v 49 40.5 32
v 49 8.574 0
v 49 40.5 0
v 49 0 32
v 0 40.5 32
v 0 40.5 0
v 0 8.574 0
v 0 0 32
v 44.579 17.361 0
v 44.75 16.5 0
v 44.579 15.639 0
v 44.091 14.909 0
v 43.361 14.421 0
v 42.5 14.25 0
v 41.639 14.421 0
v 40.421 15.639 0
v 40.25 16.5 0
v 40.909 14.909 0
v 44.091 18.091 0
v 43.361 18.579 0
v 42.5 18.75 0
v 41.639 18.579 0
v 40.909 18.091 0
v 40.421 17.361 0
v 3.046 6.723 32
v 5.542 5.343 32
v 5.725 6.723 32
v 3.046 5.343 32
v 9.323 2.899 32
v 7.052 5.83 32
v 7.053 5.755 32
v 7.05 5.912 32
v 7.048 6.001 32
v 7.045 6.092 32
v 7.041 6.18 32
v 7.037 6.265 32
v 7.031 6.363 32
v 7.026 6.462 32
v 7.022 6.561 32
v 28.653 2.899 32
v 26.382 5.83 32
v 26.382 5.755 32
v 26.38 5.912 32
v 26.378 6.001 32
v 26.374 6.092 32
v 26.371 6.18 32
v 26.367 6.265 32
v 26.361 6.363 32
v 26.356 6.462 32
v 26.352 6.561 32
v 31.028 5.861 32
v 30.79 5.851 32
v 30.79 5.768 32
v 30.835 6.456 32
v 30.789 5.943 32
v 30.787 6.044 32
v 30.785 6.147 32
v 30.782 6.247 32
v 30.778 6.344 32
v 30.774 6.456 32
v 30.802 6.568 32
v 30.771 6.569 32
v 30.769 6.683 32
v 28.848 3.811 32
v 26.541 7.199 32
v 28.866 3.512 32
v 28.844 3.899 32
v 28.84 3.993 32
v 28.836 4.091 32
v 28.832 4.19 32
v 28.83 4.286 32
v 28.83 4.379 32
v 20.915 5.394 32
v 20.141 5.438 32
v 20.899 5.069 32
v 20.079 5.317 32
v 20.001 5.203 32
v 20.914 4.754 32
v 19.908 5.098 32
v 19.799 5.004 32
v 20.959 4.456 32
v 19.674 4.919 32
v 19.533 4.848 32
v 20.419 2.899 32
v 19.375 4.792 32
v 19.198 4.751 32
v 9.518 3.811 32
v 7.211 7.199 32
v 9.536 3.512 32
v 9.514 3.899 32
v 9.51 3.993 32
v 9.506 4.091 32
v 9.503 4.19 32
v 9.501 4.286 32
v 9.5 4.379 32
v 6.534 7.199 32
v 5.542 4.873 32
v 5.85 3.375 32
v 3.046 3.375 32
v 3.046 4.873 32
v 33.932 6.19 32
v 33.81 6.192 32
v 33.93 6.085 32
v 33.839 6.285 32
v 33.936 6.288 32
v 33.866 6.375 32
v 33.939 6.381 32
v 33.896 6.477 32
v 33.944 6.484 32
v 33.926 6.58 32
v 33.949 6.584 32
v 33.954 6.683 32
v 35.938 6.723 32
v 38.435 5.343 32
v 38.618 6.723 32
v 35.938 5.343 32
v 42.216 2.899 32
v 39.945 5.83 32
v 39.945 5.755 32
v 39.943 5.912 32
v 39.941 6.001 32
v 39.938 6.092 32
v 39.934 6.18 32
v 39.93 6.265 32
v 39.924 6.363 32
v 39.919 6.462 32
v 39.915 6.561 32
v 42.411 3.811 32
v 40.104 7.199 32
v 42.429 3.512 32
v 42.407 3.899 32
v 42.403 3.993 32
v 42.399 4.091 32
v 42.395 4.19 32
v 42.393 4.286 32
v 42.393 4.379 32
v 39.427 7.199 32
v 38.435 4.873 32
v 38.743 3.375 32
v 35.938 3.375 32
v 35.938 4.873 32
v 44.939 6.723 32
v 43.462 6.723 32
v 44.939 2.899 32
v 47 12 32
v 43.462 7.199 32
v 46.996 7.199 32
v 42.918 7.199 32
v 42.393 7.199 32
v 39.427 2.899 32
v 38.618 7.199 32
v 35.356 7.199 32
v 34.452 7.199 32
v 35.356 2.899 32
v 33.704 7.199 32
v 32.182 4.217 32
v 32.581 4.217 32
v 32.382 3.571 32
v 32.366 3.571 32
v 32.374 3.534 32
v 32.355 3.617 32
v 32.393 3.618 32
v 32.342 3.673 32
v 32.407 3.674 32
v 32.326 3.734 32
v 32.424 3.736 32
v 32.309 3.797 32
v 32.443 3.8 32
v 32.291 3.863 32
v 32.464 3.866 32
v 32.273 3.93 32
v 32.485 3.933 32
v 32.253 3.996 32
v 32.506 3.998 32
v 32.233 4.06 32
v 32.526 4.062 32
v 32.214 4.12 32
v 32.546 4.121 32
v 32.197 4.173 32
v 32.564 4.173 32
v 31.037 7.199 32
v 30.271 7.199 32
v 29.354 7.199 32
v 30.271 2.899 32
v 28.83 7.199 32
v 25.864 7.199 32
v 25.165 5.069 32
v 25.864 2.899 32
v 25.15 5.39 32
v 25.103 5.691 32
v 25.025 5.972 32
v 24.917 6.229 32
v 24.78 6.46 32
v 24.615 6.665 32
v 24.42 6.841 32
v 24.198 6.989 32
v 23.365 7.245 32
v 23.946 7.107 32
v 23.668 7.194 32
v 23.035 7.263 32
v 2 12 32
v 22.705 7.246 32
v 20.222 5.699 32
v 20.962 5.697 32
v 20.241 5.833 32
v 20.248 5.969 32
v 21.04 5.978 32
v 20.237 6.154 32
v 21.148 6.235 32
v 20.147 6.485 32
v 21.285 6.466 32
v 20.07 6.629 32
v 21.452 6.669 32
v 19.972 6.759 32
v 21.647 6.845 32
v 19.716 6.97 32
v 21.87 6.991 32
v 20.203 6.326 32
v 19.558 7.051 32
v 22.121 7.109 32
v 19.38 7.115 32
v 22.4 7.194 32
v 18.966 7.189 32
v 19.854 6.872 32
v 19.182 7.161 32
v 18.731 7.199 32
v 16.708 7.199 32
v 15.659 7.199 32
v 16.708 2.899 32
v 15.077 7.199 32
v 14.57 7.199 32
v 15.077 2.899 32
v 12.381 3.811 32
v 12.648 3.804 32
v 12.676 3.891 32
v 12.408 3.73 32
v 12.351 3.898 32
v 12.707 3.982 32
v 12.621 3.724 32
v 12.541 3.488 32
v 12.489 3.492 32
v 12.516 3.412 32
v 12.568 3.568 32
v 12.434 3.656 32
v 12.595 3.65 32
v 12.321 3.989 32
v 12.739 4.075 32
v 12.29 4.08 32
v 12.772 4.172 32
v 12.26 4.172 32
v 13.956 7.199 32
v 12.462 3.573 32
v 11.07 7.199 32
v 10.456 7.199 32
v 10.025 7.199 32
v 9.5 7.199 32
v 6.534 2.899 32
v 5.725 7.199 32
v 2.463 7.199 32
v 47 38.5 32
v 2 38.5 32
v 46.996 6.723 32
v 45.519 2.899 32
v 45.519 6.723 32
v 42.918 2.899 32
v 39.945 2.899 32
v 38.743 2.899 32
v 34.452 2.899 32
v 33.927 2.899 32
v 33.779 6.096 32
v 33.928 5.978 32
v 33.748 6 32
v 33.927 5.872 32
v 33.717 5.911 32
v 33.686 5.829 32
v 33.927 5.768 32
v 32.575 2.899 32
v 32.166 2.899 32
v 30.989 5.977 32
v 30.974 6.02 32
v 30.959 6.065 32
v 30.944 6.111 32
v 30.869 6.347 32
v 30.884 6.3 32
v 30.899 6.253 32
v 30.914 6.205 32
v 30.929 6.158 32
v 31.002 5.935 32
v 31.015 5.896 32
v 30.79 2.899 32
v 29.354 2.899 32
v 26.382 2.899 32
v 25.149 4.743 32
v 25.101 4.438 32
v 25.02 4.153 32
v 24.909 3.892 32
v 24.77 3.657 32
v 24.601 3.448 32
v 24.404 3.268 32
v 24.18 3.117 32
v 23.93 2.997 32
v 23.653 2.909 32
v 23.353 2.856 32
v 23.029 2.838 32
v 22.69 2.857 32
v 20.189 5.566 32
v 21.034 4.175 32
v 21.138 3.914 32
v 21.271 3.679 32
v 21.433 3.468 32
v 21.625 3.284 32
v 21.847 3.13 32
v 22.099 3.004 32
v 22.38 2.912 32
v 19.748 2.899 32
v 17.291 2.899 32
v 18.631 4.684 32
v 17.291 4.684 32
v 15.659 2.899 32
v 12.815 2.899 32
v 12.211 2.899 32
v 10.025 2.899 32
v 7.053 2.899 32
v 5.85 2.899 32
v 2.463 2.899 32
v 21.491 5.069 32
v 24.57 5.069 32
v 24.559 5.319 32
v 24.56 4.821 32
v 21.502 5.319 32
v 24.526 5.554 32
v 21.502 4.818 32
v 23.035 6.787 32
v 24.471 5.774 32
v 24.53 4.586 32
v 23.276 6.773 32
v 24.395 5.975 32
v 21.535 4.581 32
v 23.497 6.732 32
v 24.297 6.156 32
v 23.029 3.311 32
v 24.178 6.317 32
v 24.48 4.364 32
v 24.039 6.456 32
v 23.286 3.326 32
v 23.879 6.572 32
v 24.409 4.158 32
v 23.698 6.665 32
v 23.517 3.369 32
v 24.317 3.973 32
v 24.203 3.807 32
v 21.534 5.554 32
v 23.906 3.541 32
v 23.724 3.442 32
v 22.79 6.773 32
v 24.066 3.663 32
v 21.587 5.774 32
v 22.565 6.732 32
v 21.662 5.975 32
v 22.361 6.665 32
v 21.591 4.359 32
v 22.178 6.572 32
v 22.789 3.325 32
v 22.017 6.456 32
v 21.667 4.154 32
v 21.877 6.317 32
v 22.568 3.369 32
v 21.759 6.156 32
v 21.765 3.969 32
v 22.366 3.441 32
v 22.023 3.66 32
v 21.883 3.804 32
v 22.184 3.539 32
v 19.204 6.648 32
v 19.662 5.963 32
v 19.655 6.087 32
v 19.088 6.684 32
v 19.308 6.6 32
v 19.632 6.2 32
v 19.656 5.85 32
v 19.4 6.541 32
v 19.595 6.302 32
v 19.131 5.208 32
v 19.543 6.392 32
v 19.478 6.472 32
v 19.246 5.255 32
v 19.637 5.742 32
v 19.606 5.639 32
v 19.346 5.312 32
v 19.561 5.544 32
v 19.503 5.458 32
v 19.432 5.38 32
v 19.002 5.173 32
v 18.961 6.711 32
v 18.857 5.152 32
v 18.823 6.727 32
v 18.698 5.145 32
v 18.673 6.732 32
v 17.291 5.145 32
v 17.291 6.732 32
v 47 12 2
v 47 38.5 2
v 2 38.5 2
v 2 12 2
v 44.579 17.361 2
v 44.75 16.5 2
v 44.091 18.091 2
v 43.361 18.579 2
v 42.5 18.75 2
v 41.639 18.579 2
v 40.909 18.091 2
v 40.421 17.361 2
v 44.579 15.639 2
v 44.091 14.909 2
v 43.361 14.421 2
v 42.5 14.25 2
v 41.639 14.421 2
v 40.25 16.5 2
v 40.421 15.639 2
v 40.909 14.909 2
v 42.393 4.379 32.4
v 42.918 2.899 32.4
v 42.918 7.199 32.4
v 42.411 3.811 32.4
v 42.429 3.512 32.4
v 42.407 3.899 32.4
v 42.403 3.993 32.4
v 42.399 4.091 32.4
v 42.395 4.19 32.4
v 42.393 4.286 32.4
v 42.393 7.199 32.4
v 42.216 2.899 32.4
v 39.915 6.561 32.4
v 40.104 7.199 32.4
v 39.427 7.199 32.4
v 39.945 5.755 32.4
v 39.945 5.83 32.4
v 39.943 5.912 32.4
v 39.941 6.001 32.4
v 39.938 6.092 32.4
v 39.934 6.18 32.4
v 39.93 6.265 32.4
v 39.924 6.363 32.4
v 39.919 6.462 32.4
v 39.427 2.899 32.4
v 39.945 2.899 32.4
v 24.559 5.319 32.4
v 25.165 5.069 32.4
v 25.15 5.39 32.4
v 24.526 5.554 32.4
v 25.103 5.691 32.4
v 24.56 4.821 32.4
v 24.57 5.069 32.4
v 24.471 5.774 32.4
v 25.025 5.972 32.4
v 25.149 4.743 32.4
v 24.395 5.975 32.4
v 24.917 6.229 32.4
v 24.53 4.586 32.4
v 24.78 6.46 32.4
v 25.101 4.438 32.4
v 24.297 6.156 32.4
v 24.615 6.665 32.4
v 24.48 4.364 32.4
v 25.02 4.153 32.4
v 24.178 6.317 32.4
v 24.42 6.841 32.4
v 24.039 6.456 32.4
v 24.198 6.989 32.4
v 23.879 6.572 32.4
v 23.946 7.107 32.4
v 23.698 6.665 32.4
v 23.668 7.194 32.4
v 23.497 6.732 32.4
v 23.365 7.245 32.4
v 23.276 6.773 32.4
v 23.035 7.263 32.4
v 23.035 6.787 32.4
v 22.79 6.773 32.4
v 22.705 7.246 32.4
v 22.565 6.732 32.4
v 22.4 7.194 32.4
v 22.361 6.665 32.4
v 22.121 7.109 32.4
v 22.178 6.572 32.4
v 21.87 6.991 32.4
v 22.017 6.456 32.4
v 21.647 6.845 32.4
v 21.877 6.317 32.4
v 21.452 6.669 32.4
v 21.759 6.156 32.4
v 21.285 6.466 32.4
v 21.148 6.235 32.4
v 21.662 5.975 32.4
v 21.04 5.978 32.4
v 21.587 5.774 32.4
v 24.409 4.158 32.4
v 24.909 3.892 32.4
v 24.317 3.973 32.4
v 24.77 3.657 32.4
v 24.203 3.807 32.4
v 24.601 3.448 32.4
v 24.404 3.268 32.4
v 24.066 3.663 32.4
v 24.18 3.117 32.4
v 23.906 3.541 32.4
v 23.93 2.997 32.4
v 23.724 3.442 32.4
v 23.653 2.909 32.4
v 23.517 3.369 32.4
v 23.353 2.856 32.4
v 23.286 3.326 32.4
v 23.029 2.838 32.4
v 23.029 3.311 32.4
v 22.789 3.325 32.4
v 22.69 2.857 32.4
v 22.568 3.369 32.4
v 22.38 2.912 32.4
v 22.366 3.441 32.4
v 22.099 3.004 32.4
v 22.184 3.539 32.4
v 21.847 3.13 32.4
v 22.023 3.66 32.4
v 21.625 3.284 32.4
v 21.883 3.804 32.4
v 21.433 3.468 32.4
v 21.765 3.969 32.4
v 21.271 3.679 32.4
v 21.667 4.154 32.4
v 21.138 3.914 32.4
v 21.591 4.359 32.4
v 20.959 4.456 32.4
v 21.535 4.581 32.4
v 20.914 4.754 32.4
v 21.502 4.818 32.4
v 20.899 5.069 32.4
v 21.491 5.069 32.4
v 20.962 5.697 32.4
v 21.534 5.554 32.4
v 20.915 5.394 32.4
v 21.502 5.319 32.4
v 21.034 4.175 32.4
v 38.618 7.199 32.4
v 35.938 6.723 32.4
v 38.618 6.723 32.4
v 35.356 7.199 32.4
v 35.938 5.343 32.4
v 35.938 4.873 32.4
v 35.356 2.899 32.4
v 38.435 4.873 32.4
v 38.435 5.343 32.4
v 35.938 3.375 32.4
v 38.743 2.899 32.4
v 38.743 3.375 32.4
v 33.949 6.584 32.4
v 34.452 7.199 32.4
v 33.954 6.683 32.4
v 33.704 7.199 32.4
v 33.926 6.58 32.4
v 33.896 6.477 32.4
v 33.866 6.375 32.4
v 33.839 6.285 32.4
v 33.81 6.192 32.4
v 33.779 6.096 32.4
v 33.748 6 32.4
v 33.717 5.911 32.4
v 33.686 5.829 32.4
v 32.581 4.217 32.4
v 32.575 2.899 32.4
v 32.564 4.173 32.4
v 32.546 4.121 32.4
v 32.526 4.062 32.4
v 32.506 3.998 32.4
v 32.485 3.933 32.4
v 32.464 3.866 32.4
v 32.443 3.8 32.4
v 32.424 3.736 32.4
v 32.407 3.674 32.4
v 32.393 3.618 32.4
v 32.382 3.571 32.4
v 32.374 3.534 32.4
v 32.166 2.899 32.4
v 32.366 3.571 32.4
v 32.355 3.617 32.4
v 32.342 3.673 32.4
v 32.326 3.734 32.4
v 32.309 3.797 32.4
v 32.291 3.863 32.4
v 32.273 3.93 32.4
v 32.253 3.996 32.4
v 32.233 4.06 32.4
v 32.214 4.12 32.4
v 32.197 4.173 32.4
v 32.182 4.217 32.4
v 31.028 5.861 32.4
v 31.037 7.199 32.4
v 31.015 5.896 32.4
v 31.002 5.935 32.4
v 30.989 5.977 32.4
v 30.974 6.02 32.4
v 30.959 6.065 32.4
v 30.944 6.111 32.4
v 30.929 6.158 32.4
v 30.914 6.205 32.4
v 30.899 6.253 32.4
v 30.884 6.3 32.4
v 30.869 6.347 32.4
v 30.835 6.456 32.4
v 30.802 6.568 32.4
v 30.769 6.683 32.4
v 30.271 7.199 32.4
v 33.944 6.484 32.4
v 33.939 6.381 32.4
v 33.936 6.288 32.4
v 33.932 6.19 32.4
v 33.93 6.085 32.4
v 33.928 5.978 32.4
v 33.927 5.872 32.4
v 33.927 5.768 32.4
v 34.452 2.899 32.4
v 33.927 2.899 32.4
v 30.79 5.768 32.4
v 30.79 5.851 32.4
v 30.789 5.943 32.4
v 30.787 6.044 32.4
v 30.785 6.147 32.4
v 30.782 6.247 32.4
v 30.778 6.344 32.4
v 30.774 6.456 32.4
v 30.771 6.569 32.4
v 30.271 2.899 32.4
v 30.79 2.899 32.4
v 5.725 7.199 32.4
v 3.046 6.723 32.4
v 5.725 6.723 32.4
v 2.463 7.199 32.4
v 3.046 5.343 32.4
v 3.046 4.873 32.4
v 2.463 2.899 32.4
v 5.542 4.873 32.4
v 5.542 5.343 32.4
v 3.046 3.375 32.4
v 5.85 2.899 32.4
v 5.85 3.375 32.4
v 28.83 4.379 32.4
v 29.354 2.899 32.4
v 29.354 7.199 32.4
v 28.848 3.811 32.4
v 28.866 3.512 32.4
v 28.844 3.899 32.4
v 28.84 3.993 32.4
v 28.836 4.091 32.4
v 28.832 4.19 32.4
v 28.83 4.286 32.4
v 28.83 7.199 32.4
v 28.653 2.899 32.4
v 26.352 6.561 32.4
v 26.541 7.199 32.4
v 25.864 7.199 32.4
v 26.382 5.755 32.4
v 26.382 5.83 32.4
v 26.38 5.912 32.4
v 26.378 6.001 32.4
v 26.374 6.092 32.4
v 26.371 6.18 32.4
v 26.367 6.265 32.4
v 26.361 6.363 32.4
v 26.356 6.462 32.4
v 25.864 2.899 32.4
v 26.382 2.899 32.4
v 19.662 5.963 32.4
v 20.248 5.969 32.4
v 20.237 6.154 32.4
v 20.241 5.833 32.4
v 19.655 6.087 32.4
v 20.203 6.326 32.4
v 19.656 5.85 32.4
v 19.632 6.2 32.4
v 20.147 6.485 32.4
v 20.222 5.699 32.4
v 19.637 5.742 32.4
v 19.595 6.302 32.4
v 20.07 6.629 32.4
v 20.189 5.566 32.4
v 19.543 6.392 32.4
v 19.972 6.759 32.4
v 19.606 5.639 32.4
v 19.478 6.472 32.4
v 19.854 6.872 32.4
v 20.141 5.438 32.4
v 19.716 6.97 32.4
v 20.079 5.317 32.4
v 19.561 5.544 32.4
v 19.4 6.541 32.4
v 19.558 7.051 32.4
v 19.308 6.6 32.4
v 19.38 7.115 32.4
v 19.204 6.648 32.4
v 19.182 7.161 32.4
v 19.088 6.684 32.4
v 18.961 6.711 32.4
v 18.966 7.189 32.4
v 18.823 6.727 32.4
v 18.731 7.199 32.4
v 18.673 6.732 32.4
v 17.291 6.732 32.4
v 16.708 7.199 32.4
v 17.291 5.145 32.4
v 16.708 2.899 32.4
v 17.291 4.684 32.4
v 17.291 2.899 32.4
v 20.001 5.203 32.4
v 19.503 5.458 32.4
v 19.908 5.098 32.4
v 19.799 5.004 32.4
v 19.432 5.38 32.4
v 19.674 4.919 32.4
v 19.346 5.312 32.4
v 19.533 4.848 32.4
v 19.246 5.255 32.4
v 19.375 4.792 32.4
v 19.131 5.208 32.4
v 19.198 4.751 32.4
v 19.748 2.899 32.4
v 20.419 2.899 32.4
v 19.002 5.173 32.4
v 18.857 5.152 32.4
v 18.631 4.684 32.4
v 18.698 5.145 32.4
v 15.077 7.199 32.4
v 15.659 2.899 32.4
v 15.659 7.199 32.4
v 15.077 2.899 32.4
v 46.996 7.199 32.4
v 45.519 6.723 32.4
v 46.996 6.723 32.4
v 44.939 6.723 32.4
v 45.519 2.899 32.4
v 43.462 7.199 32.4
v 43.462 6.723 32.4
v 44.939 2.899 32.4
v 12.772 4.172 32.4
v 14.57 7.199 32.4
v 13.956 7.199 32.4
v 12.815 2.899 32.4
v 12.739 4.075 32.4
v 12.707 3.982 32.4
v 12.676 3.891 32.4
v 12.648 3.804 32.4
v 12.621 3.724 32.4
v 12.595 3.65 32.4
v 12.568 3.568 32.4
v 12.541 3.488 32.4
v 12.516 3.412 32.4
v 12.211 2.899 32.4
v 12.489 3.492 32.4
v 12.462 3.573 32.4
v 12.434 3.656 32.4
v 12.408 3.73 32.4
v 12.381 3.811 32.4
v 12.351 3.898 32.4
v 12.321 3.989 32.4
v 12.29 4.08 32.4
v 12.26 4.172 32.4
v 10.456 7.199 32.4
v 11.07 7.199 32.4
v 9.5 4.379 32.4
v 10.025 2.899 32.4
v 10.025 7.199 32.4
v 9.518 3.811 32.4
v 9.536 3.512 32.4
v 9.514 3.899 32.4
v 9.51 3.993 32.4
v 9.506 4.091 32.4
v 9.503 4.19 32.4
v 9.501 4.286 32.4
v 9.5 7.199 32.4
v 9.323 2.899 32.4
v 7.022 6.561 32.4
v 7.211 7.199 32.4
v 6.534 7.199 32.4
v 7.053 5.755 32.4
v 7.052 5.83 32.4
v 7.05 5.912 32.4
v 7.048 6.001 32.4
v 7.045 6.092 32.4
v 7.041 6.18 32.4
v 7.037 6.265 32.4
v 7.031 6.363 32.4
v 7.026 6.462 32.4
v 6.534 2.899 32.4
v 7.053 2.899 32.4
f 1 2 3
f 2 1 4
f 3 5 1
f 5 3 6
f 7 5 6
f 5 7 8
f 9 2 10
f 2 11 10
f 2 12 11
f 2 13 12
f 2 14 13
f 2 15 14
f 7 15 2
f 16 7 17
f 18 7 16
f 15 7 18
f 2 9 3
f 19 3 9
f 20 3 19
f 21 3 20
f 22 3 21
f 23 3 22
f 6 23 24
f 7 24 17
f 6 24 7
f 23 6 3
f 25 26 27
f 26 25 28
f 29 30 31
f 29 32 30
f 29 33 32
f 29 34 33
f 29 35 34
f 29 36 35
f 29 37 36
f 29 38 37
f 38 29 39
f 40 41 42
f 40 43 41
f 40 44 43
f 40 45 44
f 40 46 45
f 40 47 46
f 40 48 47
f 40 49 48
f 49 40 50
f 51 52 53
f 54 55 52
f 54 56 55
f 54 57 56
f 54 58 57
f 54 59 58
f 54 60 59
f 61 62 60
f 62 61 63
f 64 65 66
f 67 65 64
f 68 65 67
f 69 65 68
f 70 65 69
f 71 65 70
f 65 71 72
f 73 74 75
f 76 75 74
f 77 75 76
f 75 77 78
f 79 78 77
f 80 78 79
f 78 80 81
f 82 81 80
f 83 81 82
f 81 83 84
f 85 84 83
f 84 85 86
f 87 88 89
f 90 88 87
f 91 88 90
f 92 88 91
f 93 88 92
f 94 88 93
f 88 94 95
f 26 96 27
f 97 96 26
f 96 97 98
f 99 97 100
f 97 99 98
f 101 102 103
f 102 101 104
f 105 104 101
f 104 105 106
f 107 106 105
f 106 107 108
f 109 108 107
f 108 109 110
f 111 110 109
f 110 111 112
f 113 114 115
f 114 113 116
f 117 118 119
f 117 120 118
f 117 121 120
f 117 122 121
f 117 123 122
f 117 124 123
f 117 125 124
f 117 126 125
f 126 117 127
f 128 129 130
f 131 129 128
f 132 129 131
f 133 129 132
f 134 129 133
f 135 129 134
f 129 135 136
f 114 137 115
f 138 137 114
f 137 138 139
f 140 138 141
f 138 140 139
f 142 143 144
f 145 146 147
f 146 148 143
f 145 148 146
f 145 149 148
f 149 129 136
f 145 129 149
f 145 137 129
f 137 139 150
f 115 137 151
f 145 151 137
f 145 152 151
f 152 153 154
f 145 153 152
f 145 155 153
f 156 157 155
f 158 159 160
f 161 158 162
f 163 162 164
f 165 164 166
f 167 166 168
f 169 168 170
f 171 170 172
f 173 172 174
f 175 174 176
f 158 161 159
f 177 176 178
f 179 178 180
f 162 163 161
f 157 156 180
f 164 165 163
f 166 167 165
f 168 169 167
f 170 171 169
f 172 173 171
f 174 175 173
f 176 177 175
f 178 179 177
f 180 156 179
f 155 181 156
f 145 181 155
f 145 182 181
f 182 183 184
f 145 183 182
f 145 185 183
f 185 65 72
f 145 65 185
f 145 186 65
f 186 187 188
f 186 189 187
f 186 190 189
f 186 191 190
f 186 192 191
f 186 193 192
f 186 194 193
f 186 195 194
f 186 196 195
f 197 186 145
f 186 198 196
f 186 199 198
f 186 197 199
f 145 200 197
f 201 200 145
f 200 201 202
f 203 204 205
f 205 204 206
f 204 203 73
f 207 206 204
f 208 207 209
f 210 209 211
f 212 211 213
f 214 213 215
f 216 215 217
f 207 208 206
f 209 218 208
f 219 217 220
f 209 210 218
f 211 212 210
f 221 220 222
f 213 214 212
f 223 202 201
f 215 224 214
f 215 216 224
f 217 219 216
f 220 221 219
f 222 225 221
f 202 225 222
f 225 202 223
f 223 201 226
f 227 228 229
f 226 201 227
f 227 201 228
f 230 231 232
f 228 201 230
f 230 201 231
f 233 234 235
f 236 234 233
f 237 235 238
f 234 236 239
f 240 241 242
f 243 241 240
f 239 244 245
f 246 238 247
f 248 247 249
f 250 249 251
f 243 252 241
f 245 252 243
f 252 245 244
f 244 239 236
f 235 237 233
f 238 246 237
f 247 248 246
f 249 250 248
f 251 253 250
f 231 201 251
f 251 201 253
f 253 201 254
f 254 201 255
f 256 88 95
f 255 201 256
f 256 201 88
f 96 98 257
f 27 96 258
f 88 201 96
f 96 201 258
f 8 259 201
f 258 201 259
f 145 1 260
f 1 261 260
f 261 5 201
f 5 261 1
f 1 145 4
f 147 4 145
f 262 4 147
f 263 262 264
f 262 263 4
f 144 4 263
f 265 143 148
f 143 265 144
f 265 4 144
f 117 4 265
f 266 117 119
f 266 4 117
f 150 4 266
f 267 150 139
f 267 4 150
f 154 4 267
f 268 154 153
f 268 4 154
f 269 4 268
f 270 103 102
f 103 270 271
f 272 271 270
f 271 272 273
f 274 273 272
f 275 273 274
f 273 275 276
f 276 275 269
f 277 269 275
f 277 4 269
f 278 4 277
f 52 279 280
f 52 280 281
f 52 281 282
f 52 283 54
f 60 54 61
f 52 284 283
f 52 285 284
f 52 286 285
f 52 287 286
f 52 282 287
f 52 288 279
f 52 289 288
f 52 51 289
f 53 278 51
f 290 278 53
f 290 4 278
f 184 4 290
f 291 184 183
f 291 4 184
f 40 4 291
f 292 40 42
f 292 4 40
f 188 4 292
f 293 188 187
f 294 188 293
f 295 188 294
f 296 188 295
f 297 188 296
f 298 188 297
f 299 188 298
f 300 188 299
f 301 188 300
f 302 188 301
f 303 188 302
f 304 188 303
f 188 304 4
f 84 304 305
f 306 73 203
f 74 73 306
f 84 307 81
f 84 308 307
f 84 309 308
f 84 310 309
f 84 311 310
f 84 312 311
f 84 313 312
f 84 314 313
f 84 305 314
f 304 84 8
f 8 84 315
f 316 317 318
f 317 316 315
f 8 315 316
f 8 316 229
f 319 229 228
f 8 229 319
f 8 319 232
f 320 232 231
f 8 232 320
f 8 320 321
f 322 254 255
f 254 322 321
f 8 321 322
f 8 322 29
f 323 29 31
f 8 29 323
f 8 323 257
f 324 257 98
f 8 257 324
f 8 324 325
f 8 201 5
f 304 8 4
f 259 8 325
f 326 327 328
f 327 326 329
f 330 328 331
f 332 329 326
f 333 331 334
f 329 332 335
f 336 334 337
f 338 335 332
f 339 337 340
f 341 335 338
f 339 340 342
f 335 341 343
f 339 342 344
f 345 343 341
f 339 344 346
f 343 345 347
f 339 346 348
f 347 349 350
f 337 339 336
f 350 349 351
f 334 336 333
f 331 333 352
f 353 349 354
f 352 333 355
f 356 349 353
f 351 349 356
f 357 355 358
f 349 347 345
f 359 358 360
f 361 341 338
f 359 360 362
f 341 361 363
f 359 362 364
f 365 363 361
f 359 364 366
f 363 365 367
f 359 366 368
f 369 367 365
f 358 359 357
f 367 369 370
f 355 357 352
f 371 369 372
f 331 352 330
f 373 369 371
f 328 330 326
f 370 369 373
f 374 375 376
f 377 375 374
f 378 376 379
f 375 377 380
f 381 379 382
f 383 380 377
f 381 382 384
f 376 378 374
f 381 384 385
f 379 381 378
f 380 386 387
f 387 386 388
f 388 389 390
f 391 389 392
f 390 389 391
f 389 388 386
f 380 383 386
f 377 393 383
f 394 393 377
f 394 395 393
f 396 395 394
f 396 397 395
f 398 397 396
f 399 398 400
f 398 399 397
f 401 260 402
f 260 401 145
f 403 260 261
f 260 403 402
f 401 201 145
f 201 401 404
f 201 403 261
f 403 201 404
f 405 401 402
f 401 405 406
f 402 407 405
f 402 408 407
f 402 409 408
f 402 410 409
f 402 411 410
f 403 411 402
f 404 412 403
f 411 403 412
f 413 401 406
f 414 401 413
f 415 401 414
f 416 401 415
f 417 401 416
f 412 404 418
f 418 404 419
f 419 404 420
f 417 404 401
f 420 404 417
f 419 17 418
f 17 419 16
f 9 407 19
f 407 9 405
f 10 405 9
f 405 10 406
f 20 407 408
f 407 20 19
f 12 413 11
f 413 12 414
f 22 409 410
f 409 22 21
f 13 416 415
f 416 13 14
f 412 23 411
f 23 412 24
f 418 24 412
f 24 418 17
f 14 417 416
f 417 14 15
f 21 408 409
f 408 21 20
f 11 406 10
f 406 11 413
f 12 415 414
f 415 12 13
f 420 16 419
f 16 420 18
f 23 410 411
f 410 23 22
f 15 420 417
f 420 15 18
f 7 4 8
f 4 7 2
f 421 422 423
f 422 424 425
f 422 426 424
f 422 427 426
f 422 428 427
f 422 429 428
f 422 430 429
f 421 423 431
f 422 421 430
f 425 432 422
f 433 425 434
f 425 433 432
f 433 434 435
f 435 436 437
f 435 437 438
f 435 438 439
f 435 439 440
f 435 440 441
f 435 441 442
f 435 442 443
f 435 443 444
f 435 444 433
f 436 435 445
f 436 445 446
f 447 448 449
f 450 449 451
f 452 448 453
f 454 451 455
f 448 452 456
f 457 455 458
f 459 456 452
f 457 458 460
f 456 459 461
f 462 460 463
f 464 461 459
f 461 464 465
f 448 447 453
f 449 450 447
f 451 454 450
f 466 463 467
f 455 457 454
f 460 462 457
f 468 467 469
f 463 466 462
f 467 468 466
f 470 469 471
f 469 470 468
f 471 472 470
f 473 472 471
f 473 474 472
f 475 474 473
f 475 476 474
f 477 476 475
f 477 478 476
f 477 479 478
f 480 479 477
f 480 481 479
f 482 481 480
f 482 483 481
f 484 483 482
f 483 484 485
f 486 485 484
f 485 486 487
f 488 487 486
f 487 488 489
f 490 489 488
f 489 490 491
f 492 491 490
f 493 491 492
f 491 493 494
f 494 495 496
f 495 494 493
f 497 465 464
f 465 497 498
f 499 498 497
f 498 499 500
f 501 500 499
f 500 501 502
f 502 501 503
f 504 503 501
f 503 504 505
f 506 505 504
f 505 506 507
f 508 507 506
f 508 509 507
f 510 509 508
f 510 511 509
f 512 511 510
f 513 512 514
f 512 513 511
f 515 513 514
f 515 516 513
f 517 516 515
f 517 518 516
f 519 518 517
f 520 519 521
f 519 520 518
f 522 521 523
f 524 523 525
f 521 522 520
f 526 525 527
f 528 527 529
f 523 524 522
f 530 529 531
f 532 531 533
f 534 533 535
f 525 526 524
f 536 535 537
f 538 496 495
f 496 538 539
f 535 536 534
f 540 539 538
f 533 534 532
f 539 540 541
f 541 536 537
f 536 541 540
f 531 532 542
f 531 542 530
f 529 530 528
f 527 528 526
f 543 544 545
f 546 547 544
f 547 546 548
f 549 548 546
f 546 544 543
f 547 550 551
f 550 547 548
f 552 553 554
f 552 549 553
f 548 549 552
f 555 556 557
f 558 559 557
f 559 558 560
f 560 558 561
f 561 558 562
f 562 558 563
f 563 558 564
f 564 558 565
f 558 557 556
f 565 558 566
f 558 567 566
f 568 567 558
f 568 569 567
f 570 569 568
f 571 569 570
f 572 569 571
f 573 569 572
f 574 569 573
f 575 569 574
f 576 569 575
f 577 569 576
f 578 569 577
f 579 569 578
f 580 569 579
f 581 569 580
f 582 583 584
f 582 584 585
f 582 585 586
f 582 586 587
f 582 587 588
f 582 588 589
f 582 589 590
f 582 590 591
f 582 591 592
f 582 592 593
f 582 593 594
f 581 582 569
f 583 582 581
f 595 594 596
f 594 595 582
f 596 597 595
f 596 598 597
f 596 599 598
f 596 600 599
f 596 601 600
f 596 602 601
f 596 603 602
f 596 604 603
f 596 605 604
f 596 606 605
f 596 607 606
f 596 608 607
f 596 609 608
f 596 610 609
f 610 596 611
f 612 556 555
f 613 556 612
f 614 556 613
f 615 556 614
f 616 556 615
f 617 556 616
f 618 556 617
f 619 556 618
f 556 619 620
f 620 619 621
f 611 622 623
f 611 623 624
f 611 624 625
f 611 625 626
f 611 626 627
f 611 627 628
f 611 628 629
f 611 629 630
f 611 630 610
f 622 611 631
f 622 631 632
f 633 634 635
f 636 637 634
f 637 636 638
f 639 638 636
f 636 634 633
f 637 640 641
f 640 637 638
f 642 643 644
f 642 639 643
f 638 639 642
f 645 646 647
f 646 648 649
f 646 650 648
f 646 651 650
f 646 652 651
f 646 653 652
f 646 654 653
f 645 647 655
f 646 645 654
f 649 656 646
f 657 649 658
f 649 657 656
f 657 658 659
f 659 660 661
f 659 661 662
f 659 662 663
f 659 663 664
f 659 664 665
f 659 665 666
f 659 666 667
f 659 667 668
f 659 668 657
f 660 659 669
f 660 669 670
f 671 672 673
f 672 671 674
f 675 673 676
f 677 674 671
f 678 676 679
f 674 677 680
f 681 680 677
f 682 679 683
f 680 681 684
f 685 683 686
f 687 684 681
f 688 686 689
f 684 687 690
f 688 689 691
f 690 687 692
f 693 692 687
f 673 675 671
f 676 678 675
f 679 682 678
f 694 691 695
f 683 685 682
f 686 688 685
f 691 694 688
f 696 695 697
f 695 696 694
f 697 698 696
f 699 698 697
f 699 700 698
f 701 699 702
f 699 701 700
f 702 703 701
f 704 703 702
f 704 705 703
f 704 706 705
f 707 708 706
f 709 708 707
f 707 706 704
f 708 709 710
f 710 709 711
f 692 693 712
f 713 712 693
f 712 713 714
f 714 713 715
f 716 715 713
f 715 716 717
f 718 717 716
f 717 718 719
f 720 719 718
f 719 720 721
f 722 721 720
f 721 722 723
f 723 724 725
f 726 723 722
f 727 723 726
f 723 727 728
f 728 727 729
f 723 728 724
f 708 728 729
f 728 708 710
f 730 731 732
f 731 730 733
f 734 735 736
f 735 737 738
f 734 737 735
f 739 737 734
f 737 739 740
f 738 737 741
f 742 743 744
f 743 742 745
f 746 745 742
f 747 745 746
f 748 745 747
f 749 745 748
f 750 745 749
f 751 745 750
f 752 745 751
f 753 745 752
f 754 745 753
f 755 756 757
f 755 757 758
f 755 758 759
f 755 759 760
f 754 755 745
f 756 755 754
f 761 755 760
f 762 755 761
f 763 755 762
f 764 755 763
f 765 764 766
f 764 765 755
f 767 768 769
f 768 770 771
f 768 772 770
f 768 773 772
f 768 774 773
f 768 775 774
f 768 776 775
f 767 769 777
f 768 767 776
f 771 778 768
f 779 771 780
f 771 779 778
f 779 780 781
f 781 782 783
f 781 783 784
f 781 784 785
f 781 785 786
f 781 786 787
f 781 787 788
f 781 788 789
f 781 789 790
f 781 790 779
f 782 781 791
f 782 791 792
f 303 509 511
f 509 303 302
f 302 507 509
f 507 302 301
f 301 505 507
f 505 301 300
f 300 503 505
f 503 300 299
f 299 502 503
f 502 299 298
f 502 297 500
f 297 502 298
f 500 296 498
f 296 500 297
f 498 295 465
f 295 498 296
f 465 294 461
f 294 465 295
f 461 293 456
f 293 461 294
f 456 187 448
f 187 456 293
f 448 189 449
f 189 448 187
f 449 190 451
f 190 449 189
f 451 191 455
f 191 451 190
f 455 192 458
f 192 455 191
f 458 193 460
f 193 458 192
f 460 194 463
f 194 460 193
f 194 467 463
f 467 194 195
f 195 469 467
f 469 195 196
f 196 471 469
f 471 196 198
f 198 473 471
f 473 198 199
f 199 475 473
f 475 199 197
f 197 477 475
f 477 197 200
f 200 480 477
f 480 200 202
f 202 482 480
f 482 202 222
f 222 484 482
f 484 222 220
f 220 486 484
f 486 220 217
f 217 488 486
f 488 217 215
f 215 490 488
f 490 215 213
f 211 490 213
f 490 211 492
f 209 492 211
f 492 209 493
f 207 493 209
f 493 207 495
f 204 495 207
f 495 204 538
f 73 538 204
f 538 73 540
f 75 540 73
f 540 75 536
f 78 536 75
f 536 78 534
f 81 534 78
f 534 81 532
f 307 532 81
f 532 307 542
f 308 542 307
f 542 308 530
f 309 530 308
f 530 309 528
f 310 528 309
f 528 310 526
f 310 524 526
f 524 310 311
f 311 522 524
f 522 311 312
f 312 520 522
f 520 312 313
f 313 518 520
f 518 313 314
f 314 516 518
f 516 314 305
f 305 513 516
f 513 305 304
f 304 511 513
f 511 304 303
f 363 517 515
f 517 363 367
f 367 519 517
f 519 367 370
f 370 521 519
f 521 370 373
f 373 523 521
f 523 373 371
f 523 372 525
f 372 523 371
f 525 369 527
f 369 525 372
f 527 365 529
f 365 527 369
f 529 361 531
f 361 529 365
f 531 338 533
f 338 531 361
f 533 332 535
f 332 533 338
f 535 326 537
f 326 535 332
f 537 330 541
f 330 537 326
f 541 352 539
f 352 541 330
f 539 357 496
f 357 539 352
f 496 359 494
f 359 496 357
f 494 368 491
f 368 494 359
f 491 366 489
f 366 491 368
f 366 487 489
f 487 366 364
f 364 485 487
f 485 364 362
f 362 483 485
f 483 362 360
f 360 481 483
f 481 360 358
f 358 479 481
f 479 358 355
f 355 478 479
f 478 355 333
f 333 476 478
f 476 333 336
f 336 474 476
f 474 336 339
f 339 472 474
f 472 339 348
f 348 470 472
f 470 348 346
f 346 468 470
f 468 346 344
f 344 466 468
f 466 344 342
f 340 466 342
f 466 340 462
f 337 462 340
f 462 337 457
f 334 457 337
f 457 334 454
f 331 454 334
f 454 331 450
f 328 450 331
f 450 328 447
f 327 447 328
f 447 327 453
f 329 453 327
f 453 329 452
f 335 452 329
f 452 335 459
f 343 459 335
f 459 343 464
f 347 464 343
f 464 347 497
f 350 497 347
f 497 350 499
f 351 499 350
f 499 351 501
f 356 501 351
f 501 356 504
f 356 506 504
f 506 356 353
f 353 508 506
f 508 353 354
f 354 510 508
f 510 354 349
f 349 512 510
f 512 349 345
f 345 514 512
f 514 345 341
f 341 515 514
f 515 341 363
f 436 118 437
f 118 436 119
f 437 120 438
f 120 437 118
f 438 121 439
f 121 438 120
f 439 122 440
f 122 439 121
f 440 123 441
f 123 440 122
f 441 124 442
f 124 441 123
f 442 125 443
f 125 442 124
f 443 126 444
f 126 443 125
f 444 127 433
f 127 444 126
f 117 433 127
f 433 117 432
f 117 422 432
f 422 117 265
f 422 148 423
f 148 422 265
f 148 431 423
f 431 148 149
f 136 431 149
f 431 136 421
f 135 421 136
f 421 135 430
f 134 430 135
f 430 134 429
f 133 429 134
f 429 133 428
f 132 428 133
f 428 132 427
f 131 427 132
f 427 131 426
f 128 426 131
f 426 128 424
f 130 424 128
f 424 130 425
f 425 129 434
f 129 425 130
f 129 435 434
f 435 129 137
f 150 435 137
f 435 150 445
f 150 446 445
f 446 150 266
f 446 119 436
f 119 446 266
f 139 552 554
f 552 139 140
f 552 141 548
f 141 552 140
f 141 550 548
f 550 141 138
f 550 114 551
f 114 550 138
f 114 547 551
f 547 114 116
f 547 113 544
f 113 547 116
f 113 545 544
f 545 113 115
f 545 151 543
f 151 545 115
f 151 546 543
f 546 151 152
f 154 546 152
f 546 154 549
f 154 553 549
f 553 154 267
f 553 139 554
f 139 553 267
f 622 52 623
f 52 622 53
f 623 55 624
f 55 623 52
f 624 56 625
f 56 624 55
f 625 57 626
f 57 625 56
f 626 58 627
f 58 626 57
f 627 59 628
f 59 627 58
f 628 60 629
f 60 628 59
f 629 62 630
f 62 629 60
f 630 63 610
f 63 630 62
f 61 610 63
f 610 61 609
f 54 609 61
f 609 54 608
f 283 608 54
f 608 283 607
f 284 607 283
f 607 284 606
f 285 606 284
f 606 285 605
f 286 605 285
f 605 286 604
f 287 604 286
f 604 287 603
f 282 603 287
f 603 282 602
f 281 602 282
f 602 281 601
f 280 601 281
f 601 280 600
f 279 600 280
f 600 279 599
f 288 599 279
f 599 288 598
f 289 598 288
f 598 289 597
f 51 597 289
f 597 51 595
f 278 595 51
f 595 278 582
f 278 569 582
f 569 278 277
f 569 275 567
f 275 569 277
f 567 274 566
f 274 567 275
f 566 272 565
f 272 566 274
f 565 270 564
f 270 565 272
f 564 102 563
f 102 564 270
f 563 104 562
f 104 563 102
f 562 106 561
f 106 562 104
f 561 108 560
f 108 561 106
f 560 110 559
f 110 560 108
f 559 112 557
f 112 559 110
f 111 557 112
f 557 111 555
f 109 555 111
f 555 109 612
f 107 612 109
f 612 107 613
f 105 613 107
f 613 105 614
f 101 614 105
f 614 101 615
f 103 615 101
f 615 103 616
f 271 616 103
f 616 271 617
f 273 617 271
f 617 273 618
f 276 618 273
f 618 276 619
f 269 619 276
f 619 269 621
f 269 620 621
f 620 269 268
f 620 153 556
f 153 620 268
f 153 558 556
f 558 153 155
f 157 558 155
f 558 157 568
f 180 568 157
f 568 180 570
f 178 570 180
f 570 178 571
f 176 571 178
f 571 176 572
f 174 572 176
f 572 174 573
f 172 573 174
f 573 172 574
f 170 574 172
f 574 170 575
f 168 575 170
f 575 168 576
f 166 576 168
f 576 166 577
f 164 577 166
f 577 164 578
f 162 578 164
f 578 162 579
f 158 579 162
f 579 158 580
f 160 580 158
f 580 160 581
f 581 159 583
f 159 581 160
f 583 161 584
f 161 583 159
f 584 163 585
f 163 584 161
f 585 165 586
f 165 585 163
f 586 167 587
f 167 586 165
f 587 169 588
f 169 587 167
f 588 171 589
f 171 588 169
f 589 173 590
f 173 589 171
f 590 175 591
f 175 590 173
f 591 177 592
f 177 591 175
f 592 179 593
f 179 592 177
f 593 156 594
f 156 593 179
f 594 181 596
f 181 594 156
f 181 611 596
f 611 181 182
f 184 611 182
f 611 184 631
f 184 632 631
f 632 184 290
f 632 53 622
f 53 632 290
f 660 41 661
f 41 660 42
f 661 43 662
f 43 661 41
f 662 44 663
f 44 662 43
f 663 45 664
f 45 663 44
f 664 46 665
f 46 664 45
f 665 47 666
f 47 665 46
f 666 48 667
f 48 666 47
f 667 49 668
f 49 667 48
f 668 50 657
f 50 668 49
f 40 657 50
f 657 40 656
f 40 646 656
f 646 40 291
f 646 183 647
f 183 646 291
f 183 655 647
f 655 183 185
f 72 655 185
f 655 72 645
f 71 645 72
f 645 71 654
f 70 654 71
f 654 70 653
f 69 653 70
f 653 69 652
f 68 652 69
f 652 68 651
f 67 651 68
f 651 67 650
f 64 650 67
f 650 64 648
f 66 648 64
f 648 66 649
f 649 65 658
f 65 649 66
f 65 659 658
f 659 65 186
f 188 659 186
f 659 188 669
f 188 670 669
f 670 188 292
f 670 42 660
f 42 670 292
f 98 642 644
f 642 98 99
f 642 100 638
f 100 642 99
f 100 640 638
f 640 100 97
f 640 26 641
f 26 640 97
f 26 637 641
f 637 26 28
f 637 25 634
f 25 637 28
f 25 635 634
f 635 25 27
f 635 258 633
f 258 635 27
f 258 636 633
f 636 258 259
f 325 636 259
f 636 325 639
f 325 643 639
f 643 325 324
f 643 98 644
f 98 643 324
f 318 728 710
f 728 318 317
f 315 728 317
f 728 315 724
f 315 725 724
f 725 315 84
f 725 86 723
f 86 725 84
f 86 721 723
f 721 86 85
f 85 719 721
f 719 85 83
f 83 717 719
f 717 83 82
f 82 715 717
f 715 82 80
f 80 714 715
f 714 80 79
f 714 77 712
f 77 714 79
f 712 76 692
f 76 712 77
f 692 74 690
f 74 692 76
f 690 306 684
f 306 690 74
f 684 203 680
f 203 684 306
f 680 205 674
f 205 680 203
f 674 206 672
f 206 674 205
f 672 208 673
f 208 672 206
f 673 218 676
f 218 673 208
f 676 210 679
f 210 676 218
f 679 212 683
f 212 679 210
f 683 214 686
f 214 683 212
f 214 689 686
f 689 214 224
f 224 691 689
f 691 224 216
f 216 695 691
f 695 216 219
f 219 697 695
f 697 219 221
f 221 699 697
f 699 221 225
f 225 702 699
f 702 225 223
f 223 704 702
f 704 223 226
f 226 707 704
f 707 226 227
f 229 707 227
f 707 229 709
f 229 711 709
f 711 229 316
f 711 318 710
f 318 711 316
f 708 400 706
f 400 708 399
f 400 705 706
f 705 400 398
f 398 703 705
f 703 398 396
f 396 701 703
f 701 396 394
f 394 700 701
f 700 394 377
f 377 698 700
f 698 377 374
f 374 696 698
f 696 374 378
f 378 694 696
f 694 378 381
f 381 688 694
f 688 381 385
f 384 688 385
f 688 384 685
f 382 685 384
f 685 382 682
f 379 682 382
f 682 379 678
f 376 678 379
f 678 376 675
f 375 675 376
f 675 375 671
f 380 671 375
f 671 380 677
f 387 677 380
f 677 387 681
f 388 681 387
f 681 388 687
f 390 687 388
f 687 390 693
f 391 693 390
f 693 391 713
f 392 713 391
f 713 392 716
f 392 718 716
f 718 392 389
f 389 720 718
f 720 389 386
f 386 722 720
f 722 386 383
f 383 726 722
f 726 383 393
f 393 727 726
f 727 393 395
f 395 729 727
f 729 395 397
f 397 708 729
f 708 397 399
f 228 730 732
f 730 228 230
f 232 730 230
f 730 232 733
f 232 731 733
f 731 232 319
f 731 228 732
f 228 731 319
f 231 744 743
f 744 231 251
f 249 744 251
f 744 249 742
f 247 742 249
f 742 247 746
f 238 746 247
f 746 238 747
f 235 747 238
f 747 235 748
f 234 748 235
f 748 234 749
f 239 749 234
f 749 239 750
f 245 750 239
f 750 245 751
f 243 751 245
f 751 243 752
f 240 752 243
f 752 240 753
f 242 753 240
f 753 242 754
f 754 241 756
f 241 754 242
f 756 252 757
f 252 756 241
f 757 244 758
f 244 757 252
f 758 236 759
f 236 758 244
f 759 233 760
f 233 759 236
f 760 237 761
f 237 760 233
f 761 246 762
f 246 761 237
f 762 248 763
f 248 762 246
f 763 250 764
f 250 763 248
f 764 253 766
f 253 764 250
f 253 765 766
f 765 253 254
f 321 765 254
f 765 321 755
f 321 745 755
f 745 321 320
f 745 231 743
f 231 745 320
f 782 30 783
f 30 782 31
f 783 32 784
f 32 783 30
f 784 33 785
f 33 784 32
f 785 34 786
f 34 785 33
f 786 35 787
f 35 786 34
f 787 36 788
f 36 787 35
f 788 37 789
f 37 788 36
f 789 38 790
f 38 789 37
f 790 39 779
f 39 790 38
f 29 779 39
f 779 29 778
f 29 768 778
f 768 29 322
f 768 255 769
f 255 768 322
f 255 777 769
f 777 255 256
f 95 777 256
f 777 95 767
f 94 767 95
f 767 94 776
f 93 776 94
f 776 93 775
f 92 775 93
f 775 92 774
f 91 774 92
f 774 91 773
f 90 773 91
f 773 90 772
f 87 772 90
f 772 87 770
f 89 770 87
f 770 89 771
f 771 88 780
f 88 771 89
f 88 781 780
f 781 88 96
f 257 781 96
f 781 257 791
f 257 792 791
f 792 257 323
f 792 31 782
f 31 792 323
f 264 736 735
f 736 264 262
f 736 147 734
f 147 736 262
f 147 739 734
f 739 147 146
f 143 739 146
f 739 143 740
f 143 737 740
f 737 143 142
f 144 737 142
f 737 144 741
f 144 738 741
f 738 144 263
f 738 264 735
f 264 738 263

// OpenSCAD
/* [Text] */
text = "ENVIRONMENT";
text_size = 4.5;
//  (mm)
text_height = 0.4;

/* [Module dimensions] */
//  (mm)
module_width = 45;
//  (mm)
module_height = 26.5;
//  (mm)
depth = 30;
//  (mm)
cable_hole_diameter = 4.5;

/* [Other] */
//  (mm)
stand_height = 10;
//  (mm)
wall_thickness = 2;
//  (degrees)
incline = 15;

/* [Hidden] */
tx = module_width + 2 * wall_thickness;
ty = depth + wall_thickness;
tz = module_height + 2 * wall_thickness;
$fn = 16;

translate([0, 0, ty]) {
    rotate(a = [-90 + incline, 0, 0]) difference() {
        rotate(a = [-incline, 0, 0]) difference() {
            cube([tx, ty, tz + stand_height]);
            translate([wall_thickness, 0, wall_thickness + stand_height]) cube([module_width, depth, module_height]);
            translate([tx - wall_thickness - cable_hole_diameter, ty - wall_thickness, stand_height + wall_thickness + cable_hole_diameter]) rotate(a = [90, 0, 0]) cylinder(h = wall_thickness * 3, d = cable_hole_diameter, center = true);
        }
        translate([0, 0, -tz]) cube([tx, ty * 2, tz]);
    }
    translate([tx / 2, stand_height / 2, 0]) linear_extrude(text_height) text(text = text, size = text_size, font = "Arial", halign = "center", valign = "center");
}
